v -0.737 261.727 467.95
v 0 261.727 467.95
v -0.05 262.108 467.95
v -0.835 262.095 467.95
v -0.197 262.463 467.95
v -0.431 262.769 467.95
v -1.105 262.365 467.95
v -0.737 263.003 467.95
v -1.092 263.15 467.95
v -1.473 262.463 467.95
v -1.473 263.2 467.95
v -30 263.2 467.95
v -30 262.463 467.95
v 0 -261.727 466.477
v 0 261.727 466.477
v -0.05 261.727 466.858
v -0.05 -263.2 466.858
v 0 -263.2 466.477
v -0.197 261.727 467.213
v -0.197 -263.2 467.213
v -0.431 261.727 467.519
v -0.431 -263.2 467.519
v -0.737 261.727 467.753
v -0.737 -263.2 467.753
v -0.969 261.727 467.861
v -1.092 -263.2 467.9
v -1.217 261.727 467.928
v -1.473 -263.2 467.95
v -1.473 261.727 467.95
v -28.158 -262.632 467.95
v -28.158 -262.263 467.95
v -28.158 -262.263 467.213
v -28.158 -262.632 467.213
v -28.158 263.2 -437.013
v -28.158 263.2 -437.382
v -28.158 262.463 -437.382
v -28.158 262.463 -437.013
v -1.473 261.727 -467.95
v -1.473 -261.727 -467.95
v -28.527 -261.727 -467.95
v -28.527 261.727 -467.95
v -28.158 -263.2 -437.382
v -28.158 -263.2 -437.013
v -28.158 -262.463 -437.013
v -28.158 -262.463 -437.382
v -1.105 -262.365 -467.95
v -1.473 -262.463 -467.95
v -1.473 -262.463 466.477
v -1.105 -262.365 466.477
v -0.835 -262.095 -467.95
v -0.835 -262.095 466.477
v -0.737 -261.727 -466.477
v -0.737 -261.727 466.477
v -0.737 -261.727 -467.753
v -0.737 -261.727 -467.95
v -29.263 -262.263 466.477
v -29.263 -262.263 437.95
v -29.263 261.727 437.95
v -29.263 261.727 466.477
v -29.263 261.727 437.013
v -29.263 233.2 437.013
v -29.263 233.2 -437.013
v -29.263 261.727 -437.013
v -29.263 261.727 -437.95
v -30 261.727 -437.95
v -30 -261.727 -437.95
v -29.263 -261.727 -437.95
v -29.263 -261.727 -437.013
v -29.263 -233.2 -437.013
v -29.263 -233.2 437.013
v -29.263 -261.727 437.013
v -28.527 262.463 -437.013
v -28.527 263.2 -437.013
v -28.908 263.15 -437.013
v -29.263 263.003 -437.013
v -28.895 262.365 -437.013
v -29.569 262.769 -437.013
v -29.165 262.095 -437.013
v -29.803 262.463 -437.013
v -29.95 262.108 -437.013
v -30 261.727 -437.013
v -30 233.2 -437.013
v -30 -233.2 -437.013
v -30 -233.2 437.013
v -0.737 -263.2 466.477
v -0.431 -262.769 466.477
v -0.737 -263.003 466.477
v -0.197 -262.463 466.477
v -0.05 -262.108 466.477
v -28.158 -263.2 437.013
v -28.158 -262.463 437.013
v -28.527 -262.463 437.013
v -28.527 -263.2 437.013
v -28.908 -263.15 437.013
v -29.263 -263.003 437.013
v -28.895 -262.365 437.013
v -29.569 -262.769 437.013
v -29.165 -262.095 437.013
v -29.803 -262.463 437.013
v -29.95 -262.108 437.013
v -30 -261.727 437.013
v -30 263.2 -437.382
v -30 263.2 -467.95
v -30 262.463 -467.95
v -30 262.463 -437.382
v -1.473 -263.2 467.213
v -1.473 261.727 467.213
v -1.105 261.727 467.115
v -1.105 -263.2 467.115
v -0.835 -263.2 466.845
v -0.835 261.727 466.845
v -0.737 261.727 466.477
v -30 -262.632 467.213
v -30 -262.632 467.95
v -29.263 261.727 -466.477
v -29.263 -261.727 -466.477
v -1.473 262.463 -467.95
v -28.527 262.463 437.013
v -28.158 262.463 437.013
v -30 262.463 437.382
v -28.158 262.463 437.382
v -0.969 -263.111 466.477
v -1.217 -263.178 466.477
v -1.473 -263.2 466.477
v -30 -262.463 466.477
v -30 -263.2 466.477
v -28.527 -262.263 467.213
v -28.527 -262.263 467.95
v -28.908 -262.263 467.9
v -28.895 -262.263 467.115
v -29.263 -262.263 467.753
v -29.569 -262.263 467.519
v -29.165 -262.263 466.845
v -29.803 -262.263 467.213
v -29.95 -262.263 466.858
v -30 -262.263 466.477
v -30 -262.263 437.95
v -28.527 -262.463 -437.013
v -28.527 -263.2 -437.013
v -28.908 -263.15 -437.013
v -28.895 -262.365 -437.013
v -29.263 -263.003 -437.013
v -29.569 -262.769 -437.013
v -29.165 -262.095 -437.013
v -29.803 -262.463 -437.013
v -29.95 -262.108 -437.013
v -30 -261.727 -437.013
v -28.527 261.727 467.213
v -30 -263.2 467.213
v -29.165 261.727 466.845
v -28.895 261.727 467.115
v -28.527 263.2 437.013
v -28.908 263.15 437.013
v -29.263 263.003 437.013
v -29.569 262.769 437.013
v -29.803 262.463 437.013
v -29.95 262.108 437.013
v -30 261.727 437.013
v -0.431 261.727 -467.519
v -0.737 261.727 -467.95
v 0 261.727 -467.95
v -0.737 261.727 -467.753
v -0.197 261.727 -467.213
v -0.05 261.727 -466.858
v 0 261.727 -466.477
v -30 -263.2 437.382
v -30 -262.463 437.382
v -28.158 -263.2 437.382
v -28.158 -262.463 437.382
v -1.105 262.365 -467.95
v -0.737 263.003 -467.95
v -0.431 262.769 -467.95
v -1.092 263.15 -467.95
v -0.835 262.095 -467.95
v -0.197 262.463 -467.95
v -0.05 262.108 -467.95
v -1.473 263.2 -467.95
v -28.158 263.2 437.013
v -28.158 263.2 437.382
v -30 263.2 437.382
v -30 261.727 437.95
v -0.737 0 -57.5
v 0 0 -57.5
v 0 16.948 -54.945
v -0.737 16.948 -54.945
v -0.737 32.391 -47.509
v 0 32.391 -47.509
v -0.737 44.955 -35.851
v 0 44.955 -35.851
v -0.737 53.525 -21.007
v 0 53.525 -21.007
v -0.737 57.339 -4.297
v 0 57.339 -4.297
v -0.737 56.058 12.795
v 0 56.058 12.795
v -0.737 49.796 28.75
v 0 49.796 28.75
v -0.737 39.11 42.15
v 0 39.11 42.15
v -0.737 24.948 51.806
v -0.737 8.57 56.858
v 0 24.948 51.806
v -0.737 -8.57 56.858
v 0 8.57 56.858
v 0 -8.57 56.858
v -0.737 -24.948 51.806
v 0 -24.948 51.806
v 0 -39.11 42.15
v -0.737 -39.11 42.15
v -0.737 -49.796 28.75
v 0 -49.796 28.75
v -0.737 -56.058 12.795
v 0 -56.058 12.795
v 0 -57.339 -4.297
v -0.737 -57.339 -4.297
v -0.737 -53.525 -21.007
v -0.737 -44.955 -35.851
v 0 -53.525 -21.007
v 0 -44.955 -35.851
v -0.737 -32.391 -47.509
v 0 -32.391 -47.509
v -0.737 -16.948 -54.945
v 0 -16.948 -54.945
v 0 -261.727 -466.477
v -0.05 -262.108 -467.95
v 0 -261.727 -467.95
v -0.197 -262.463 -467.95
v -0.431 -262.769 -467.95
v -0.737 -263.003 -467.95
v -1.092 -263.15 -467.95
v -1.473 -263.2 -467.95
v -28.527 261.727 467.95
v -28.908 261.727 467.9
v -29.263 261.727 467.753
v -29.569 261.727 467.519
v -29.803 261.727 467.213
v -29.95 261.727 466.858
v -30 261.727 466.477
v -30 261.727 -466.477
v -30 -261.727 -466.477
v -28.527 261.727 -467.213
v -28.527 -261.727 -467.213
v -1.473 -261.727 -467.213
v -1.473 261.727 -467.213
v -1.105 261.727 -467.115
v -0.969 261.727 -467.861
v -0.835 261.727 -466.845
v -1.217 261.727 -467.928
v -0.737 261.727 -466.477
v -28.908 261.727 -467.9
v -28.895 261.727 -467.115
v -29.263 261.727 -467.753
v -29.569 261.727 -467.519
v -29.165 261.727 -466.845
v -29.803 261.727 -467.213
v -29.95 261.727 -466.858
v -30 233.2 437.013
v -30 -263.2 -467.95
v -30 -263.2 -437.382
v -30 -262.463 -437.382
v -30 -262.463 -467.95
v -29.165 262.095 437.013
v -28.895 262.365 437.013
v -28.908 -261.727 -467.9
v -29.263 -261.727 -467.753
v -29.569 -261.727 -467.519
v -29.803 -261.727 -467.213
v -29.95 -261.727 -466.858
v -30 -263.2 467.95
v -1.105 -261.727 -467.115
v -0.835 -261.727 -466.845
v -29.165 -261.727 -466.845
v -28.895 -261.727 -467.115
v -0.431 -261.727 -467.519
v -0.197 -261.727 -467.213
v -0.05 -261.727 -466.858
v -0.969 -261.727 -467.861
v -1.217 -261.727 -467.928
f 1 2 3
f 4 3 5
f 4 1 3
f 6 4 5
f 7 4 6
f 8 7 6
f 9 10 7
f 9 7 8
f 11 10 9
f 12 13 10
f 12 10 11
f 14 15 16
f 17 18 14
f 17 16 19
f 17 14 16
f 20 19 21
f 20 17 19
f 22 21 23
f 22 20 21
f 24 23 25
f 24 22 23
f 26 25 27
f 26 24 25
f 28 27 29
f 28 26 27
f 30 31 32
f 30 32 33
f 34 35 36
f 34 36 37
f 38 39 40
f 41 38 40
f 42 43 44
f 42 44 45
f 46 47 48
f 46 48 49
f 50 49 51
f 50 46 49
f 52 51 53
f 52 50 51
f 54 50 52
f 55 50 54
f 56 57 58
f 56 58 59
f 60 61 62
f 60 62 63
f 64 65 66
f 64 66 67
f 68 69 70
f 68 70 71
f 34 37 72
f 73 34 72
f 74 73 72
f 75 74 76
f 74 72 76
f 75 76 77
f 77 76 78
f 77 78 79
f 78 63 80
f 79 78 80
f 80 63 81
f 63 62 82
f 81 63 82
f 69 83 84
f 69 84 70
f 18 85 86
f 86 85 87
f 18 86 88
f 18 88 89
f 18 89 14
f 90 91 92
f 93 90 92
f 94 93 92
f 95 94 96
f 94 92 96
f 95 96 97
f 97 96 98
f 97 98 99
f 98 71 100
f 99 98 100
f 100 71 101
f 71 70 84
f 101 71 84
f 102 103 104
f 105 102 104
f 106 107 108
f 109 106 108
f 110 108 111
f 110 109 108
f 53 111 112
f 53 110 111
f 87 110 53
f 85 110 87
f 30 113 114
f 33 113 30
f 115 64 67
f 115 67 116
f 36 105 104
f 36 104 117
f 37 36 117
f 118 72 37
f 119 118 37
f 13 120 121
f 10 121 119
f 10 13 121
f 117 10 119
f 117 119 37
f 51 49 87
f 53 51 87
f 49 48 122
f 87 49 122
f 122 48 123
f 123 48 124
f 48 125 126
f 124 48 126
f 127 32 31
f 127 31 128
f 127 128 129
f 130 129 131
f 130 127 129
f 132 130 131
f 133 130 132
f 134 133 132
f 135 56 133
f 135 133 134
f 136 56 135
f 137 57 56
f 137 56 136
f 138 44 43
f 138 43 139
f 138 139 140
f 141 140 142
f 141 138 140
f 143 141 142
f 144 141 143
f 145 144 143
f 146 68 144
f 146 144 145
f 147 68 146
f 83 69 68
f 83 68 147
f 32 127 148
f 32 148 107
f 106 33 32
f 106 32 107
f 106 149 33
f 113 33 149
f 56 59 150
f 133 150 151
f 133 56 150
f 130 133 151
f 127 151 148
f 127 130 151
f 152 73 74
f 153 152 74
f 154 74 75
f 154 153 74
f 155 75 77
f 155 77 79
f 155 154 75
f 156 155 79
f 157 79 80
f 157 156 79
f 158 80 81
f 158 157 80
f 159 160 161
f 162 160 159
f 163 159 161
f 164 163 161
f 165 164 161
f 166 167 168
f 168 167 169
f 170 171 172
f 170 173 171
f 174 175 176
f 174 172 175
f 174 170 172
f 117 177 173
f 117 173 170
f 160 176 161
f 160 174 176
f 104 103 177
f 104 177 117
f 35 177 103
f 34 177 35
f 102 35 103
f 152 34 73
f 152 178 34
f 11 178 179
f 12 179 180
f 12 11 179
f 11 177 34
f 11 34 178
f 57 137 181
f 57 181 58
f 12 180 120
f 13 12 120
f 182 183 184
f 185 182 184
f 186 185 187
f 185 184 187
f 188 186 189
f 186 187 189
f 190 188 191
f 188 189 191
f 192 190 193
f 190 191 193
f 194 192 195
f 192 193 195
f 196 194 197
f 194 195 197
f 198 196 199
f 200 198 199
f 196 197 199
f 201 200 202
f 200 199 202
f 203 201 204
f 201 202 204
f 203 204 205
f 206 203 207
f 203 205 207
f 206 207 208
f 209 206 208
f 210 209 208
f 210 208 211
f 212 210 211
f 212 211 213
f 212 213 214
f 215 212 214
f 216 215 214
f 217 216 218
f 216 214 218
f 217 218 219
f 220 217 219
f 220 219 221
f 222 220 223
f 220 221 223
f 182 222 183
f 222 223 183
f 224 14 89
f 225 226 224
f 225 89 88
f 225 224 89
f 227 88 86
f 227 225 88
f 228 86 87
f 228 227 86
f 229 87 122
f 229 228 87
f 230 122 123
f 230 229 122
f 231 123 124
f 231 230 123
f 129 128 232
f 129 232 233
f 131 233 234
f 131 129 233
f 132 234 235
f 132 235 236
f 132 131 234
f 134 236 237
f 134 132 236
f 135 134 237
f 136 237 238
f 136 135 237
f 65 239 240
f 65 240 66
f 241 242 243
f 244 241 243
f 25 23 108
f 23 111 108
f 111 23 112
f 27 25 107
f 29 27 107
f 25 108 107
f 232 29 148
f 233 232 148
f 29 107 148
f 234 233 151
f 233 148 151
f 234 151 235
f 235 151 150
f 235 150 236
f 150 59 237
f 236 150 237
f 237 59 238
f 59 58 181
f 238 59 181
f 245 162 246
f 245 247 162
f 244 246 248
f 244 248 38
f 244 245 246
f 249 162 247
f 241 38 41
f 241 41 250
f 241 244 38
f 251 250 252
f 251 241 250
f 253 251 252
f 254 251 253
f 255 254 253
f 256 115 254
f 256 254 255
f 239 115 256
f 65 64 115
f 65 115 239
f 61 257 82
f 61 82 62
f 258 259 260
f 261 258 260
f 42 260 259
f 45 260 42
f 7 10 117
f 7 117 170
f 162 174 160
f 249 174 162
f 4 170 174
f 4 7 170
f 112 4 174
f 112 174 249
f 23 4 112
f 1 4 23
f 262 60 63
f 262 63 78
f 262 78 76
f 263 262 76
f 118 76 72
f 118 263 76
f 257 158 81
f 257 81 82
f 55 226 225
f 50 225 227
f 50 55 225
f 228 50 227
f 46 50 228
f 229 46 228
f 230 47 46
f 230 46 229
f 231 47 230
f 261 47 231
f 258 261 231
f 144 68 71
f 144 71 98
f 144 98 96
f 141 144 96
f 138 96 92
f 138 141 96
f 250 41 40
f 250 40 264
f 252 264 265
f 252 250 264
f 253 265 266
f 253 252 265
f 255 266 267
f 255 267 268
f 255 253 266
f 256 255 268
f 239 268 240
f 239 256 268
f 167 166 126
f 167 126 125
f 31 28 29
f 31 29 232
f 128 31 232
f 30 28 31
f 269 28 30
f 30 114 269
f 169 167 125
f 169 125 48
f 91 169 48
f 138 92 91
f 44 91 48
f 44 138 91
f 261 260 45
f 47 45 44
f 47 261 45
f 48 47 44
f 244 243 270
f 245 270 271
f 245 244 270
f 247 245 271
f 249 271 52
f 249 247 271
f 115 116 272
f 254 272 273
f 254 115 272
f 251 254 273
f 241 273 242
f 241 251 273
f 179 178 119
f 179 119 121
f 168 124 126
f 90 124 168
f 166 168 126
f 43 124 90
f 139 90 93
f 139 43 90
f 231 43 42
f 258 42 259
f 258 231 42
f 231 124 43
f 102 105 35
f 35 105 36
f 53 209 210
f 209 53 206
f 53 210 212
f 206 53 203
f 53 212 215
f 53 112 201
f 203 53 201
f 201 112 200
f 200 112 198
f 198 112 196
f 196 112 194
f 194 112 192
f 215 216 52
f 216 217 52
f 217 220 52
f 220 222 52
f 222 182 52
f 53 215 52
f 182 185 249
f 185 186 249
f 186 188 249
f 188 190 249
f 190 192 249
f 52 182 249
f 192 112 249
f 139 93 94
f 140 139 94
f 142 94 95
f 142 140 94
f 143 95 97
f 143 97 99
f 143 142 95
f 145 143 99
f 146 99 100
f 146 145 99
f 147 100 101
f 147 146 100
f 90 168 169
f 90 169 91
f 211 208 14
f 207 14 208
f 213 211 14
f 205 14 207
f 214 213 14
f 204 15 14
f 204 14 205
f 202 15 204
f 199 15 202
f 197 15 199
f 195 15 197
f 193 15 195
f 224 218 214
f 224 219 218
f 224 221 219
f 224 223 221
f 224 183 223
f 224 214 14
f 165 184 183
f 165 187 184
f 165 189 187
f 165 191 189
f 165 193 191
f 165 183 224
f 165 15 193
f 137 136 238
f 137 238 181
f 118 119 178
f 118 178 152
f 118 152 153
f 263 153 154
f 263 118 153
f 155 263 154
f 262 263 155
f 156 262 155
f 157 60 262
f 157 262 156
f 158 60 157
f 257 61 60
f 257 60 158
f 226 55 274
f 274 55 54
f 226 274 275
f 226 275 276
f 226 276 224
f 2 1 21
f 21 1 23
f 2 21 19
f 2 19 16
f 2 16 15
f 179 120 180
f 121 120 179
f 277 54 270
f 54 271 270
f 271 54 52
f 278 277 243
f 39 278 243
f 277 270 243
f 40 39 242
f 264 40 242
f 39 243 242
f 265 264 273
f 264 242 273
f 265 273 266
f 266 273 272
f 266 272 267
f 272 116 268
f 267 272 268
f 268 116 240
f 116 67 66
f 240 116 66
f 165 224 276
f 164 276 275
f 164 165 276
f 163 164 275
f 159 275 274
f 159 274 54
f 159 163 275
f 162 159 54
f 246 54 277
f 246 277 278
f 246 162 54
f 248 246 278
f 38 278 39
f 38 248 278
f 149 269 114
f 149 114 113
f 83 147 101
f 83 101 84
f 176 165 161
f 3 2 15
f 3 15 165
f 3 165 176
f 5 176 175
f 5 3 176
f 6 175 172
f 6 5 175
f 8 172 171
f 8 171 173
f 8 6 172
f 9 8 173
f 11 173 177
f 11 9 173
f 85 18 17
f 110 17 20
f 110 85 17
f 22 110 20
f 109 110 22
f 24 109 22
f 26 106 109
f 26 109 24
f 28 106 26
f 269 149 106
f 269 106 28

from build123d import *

# Parameters (mm, degrees)
SKETCH1_W                     = 935.9
SKETCH1_H                     = 526.4
SKETCH1_R                     = 57.5
BASE_FLANGE1_DEPTH            = 0.7366
EDGE_FLANGE1_STRIP_W          = 4.4196
EDGE_FLANGE1_STRIP_H          = 0.7366
EDGE_FLANGE1_STRIP_CUT_DEPTH  = 935.9
EDGE_FLANGE1_DEPTH            = 935.9
EDGE_FLANGE2_STRIP_W          = 4.4196
EDGE_FLANGE2_STRIP_H          = 0.7366
EDGE_FLANGE2_STRIP_CUT_DEPTH  = 524.9268
EDGE_FLANGE2_DEPTH            = 524.9268
EDGE_FLANGE3_STRIP_W          = 4.4196
EDGE_FLANGE3_STRIP_H          = 0.7366
EDGE_FLANGE3_STRIP_CUT_DEPTH  = 934.4268
EDGE_FLANGE3_DEPTH            = 934.4268
EDGE_FLANGE4_STRIP_W          = 4.4196
EDGE_FLANGE4_STRIP_H          = 0.7366
EDGE_FLANGE4_STRIP_CUT_DEPTH  = 523.4536
EDGE_FLANGE4_DEPTH            = 523.4536
EDGE_FLANGE5_STRIP_W          = 4.4196
EDGE_FLANGE5_STRIP_H          = 0.7366
EDGE_FLANGE5_STRIP_CUT_DEPTH  = 874.0268
EDGE_FLANGE5_RELIEF_W         = 4.7879
EDGE_FLANGE5_RELIEF_H         = 0.3683
EDGE_FLANGE5_RELIEF_CUT_DEPTH = 0.7366
EDGE_FLANGE5_DEPTH            = 874.0268
EDGE_FLANGE6_STRIP_W          = 4.4196
EDGE_FLANGE6_STRIP_H          = 0.7366
EDGE_FLANGE6_STRIP_CUT_DEPTH  = 874.0268
EDGE_FLANGE6_RELIEF_W         = 4.7879
EDGE_FLANGE6_RELIEF_H         = 0.3683
EDGE_FLANGE6_RELIEF_CUT_DEPTH = 0.7366
EDGE_FLANGE6_DEPTH            = 874.0268
EDGE_FLANGE7_STRIP_W          = 4.4196
EDGE_FLANGE7_STRIP_H          = 0.7366
EDGE_FLANGE7_STRIP_CUT_DEPTH  = 523.4536
EDGE_FLANGE7_DEPTH            = 523.4536
EDGE_FLANGE8_STRIP_W          = 4.4196
EDGE_FLANGE8_STRIP_H          = 0.7366
EDGE_FLANGE8_STRIP_CUT_DEPTH  = 523.9902
EDGE_FLANGE8_RELIEF_W         = 4.7879
EDGE_FLANGE8_RELIEF_H         = 0.3683
EDGE_FLANGE8_RELIEF_CUT_DEPTH = 0.7366
EDGE_FLANGE8_DEPTH            = 523.9902


# Sheet-metal steps are written as plain solids
with BuildPart() as part:
    # Sketch1 → Base-Flange1 (new body)
    with BuildSketch(Plane(origin=(0, 0, 0), x_dir=(0, 0, -1), z_dir=(1, 0, 0))):
        Rectangle(SKETCH1_W, SKETCH1_H)
        Circle(SKETCH1_R, mode=Mode.SUBTRACT)
    extrude(amount=-BASE_FLANGE1_DEPTH)

    # Edge-Flange1 strip (across the edge) → Edge-Flange1 strip cut (cut)
    with BuildSketch(Plane(origin=(-0.7366, 263.2, 467.95), x_dir=(0, -1, 0), z_dir=(0, 0, -1))):
        with Locations((-0.7366, -0.3683)):
            Rectangle(EDGE_FLANGE1_STRIP_W, EDGE_FLANGE1_STRIP_H)
    extrude(amount=EDGE_FLANGE1_STRIP_CUT_DEPTH, mode=Mode.SUBTRACT)

    # Edge-Flange1 section (across the edge) → Edge-Flange1 (add)
    with BuildSketch(Plane(origin=(-0.7366, 263.2, 467.95), x_dir=(0, -1, 0), z_dir=(0, 0, -1))):
        with BuildLine():
            Line((0, 0.7366), (0, 29.2634))
            Line((0, 29.2634), (0.7366, 29.2634))
            Line((0.7366, 29.2634), (0.7366, 0.7366))
            ThreePointArc((0.7366, 0.7366), (0.952345145, 0.215745145), (1.4732, 0))
            Line((1.4732, 0), (1.4732, -0.7366))
            ThreePointArc((1.4732, -0.7366), (0.43149029, -0.30510971), (0, 0.7366))
        make_face()
    extrude(amount=EDGE_FLANGE1_DEPTH)

    # Edge-Flange2 strip (across the edge) → Edge-Flange2 strip cut (cut)
    with BuildSketch(Plane(origin=(-0.7366, -263.2, 467.95), x_dir=(0, 0, -1), z_dir=(0, 1, 0))):
        with Locations((-0.7366, -0.3683)):
            Rectangle(EDGE_FLANGE2_STRIP_W, EDGE_FLANGE2_STRIP_H)
    extrude(amount=EDGE_FLANGE2_STRIP_CUT_DEPTH, mode=Mode.SUBTRACT)

    # Edge-Flange2 section (across the edge) → Edge-Flange2 (add)
    with BuildSketch(Plane(origin=(-0.7366, -263.2, 467.95), x_dir=(0, 0, -1), z_dir=(0, 1, 0))):
        with BuildLine():
            Line((0, 0.7366), (0, 29.2634))
            Line((0, 29.2634), (0.7366, 29.2634))
            Line((0.7366, 29.2634), (0.7366, 0.7366))
            ThreePointArc((0.7366, 0.7366), (0.952345145, 0.215745145), (1.4732, 0))
            Line((1.4732, 0), (1.4732, -0.7366))
            ThreePointArc((1.4732, -0.7366), (0.43149029, -0.30510971), (0, 0.7366))
        make_face()
    extrude(amount=EDGE_FLANGE2_DEPTH)

    # Edge-Flange3 strip (across the edge) → Edge-Flange3 strip cut (cut)
    with BuildSketch(Plane(origin=(-0.7366, -263.2, -467.95), x_dir=(0, 1, 0), z_dir=(0, 0, 1))):
        with Locations((-0.7366, -0.3683)):
            Rectangle(EDGE_FLANGE3_STRIP_W, EDGE_FLANGE3_STRIP_H)
    extrude(amount=EDGE_FLANGE3_STRIP_CUT_DEPTH, mode=Mode.SUBTRACT)

    # Edge-Flange3 section (across the edge) → Edge-Flange3 (add)
    with BuildSketch(Plane(origin=(-0.7366, -263.2, -467.95), x_dir=(0, 1, 0), z_dir=(0, 0, 1))):
        with BuildLine():
            Line((0, 0.7366), (0, 29.2634))
            Line((0, 29.2634), (0.7366, 29.2634))
            Line((0.7366, 29.2634), (0.7366, 0.7366))
            ThreePointArc((0.7366, 0.7366), (0.952345145, 0.215745145), (1.4732, 0))
            Line((1.4732, 0), (1.4732, -0.7366))
            ThreePointArc((1.4732, -0.7366), (0.43149029, -0.30510971), (0, 0.7366))
        make_face()
    extrude(amount=EDGE_FLANGE3_DEPTH)

    # Edge-Flange4 strip (across the edge) → Edge-Flange4 strip cut (cut)
    with BuildSketch(Plane(origin=(-0.7366, 261.7268, -467.95), x_dir=(0, 0, 1), z_dir=(0, -1, 0))):
        with Locations((-0.7366, -0.3683)):
            Rectangle(EDGE_FLANGE4_STRIP_W, EDGE_FLANGE4_STRIP_H)
    extrude(amount=EDGE_FLANGE4_STRIP_CUT_DEPTH, mode=Mode.SUBTRACT)

    # Edge-Flange4 section (across the edge) → Edge-Flange4 (add)
    with BuildSketch(Plane(origin=(-0.7366, 261.7268, -467.95), x_dir=(0, 0, 1), z_dir=(0, -1, 0))):
        with BuildLine():
            Line((0, 0.7366), (0, 29.2634))
            Line((0, 29.2634), (0.7366, 29.2634))
            Line((0.7366, 29.2634), (0.7366, 0.7366))
            ThreePointArc((0.7366, 0.7366), (0.952345145, 0.215745145), (1.4732, 0))
            Line((1.4732, 0), (1.4732, -0.7366))
            ThreePointArc((1.4732, -0.7366), (0.43149029, -0.30510971), (0, 0.7366))
        make_face()
    extrude(amount=EDGE_FLANGE4_DEPTH)

    # Edge-Flange5 strip (across the edge) → Edge-Flange5 strip cut (cut)
    with BuildSketch(Plane(origin=(-30, 262.4634, 437.0134), x_dir=(1, 0, 0), z_dir=(0, 0, -1))):
        with Locations((-0.7366, -0.3683)):
            Rectangle(EDGE_FLANGE5_STRIP_W, EDGE_FLANGE5_STRIP_H)
    extrude(amount=EDGE_FLANGE5_STRIP_CUT_DEPTH, mode=Mode.SUBTRACT)

    # Edge-Flange5 relief (on the sheet) → Edge-Flange5 relief cut (cut)
    with BuildSketch(Plane(origin=(-28.5268, 262.4634, 437.0134), x_dir=(1, 0, 0), z_dir=(0, -1, 0))):
        with Locations((-2.02565, 0.18415)):
            Rectangle(EDGE_FLANGE5_RELIEF_W, EDGE_FLANGE5_RELIEF_H)
        with Locations((-2.02565, -874.21095)):
            Rectangle(EDGE_FLANGE5_RELIEF_W, EDGE_FLANGE5_RELIEF_H)
    extrude(amount=-EDGE_FLANGE5_RELIEF_CUT_DEPTH, mode=Mode.SUBTRACT)

    # Edge-Flange5 section (across the edge) → Edge-Flange5 (add)
    with BuildSketch(Plane(origin=(-30, 262.4634, 437.0134), x_dir=(1, 0, 0), z_dir=(0, 0, -1))):
        with BuildLine():
            Line((0, 0.7366), (0, 29.2634))
            Line((0, 29.2634), (0.7366, 29.2634))
            Line((0.7366, 29.2634), (0.7366, 0.7366))
            ThreePointArc((0.7366, 0.7366), (0.952345145, 0.215745145), (1.4732, 0))
            Line((1.4732, 0), (1.4732, -0.7366))
            ThreePointArc((1.4732, -0.7366), (0.43149029, -0.30510971), (0, 0.7366))
        make_face()
    extrude(amount=EDGE_FLANGE5_DEPTH)

    # Edge-Flange6 strip (across the edge) → Edge-Flange6 strip cut (cut)
    with BuildSketch(Plane(origin=(-30, -262.4634, -437.0134), x_dir=(1, 0, 0), z_dir=(0, 0, 1))):
        with Locations((-0.7366, -0.3683)):
            Rectangle(EDGE_FLANGE6_STRIP_W, EDGE_FLANGE6_STRIP_H)
    extrude(amount=EDGE_FLANGE6_STRIP_CUT_DEPTH, mode=Mode.SUBTRACT)

    # Edge-Flange6 relief (on the sheet) → Edge-Flange6 relief cut (cut)
    with BuildSketch(Plane(origin=(-28.5268, -262.4634, -437.0134), x_dir=(1, 0, 0), z_dir=(0, 1, 0))):
        with Locations((-2.02565, 0.18415)):
            Rectangle(EDGE_FLANGE6_RELIEF_W, EDGE_FLANGE6_RELIEF_H)
        with Locations((-2.02565, -874.21095)):
            Rectangle(EDGE_FLANGE6_RELIEF_W, EDGE_FLANGE6_RELIEF_H)
    extrude(amount=-EDGE_FLANGE6_RELIEF_CUT_DEPTH, mode=Mode.SUBTRACT)

    # Edge-Flange6 section (across the edge) → Edge-Flange6 (add)
    with BuildSketch(Plane(origin=(-30, -262.4634, -437.0134), x_dir=(1, 0, 0), z_dir=(0, 0, 1))):
        with BuildLine():
            Line((0, 0.7366), (0, 29.2634))
            Line((0, 29.2634), (0.7366, 29.2634))
            Line((0.7366, 29.2634), (0.7366, 0.7366))
            ThreePointArc((0.7366, 0.7366), (0.952345145, 0.215745145), (1.4732, 0))
            Line((1.4732, 0), (1.4732, -0.7366))
            ThreePointArc((1.4732, -0.7366), (0.43149029, -0.30510971), (0, 0.7366))
        make_face()
    extrude(amount=EDGE_FLANGE6_DEPTH)

    # Edge-Flange7 strip (across the edge) → Edge-Flange7 strip cut (cut)
    with BuildSketch(Plane(origin=(-30, 261.7268, -467.2134), x_dir=(1, 0, 0), z_dir=(0, -1, 0))):
        with Locations((-0.7366, -0.3683)):
            Rectangle(EDGE_FLANGE7_STRIP_W, EDGE_FLANGE7_STRIP_H)
    extrude(amount=EDGE_FLANGE7_STRIP_CUT_DEPTH, mode=Mode.SUBTRACT)

    # Edge-Flange7 section (across the edge) → Edge-Flange7 (add)
    with BuildSketch(Plane(origin=(-30, 261.7268, -467.2134), x_dir=(1, 0, 0), z_dir=(0, -1, 0))):
        with BuildLine():
            Line((0, 0.7366), (0, 29.2634))
            Line((0, 29.2634), (0.7366, 29.2634))
            Line((0.7366, 29.2634), (0.7366, 0.7366))
            ThreePointArc((0.7366, 0.7366), (0.952345145, 0.215745145), (1.4732, 0))
            Line((1.4732, 0), (1.4732, -0.7366))
            ThreePointArc((1.4732, -0.7366), (0.43149029, -0.30510971), (0, 0.7366))
        make_face()
    extrude(amount=EDGE_FLANGE7_DEPTH)

    # Edge-Flange8 strip (across the edge) → Edge-Flange8 strip cut (cut)
    with BuildSketch(Plane(origin=(-30, -262.2634, 467.2134), x_dir=(1, 0, 0), z_dir=(0, 1, 0))):
        with Locations((-0.7366, -0.3683)):
            Rectangle(EDGE_FLANGE8_STRIP_W, EDGE_FLANGE8_STRIP_H)
    extrude(amount=EDGE_FLANGE8_STRIP_CUT_DEPTH, mode=Mode.SUBTRACT)

    # Edge-Flange8 relief (on the sheet) → Edge-Flange8 relief cut (cut)
    with BuildSketch(Plane(origin=(-28.5268, -262.2634, 467.2134), x_dir=(1, 0, 0), z_dir=(0, 0, -1))):
        with Locations((-2.02565, 0.18415)):
            Rectangle(EDGE_FLANGE8_RELIEF_W, EDGE_FLANGE8_RELIEF_H)
    extrude(amount=-EDGE_FLANGE8_RELIEF_CUT_DEPTH, mode=Mode.SUBTRACT)

    # Edge-Flange8 section (across the edge) → Edge-Flange8 (add)
    with BuildSketch(Plane(origin=(-30, -262.2634, 467.2134), x_dir=(1, 0, 0), z_dir=(0, 1, 0))):
        with BuildLine():
            Line((0, 0.7366), (0, 29.2634))
            Line((0, 29.2634), (0.7366, 29.2634))
            Line((0.7366, 29.2634), (0.7366, 0.7366))
            ThreePointArc((0.7366, 0.7366), (0.952345145, 0.215745145), (1.4732, 0))
            Line((1.4732, 0), (1.4732, -0.7366))
            ThreePointArc((1.4732, -0.7366), (0.43149029, -0.30510971), (0, 0.7366))
        make_face()
    extrude(amount=EDGE_FLANGE8_DEPTH)


solid = part.part
